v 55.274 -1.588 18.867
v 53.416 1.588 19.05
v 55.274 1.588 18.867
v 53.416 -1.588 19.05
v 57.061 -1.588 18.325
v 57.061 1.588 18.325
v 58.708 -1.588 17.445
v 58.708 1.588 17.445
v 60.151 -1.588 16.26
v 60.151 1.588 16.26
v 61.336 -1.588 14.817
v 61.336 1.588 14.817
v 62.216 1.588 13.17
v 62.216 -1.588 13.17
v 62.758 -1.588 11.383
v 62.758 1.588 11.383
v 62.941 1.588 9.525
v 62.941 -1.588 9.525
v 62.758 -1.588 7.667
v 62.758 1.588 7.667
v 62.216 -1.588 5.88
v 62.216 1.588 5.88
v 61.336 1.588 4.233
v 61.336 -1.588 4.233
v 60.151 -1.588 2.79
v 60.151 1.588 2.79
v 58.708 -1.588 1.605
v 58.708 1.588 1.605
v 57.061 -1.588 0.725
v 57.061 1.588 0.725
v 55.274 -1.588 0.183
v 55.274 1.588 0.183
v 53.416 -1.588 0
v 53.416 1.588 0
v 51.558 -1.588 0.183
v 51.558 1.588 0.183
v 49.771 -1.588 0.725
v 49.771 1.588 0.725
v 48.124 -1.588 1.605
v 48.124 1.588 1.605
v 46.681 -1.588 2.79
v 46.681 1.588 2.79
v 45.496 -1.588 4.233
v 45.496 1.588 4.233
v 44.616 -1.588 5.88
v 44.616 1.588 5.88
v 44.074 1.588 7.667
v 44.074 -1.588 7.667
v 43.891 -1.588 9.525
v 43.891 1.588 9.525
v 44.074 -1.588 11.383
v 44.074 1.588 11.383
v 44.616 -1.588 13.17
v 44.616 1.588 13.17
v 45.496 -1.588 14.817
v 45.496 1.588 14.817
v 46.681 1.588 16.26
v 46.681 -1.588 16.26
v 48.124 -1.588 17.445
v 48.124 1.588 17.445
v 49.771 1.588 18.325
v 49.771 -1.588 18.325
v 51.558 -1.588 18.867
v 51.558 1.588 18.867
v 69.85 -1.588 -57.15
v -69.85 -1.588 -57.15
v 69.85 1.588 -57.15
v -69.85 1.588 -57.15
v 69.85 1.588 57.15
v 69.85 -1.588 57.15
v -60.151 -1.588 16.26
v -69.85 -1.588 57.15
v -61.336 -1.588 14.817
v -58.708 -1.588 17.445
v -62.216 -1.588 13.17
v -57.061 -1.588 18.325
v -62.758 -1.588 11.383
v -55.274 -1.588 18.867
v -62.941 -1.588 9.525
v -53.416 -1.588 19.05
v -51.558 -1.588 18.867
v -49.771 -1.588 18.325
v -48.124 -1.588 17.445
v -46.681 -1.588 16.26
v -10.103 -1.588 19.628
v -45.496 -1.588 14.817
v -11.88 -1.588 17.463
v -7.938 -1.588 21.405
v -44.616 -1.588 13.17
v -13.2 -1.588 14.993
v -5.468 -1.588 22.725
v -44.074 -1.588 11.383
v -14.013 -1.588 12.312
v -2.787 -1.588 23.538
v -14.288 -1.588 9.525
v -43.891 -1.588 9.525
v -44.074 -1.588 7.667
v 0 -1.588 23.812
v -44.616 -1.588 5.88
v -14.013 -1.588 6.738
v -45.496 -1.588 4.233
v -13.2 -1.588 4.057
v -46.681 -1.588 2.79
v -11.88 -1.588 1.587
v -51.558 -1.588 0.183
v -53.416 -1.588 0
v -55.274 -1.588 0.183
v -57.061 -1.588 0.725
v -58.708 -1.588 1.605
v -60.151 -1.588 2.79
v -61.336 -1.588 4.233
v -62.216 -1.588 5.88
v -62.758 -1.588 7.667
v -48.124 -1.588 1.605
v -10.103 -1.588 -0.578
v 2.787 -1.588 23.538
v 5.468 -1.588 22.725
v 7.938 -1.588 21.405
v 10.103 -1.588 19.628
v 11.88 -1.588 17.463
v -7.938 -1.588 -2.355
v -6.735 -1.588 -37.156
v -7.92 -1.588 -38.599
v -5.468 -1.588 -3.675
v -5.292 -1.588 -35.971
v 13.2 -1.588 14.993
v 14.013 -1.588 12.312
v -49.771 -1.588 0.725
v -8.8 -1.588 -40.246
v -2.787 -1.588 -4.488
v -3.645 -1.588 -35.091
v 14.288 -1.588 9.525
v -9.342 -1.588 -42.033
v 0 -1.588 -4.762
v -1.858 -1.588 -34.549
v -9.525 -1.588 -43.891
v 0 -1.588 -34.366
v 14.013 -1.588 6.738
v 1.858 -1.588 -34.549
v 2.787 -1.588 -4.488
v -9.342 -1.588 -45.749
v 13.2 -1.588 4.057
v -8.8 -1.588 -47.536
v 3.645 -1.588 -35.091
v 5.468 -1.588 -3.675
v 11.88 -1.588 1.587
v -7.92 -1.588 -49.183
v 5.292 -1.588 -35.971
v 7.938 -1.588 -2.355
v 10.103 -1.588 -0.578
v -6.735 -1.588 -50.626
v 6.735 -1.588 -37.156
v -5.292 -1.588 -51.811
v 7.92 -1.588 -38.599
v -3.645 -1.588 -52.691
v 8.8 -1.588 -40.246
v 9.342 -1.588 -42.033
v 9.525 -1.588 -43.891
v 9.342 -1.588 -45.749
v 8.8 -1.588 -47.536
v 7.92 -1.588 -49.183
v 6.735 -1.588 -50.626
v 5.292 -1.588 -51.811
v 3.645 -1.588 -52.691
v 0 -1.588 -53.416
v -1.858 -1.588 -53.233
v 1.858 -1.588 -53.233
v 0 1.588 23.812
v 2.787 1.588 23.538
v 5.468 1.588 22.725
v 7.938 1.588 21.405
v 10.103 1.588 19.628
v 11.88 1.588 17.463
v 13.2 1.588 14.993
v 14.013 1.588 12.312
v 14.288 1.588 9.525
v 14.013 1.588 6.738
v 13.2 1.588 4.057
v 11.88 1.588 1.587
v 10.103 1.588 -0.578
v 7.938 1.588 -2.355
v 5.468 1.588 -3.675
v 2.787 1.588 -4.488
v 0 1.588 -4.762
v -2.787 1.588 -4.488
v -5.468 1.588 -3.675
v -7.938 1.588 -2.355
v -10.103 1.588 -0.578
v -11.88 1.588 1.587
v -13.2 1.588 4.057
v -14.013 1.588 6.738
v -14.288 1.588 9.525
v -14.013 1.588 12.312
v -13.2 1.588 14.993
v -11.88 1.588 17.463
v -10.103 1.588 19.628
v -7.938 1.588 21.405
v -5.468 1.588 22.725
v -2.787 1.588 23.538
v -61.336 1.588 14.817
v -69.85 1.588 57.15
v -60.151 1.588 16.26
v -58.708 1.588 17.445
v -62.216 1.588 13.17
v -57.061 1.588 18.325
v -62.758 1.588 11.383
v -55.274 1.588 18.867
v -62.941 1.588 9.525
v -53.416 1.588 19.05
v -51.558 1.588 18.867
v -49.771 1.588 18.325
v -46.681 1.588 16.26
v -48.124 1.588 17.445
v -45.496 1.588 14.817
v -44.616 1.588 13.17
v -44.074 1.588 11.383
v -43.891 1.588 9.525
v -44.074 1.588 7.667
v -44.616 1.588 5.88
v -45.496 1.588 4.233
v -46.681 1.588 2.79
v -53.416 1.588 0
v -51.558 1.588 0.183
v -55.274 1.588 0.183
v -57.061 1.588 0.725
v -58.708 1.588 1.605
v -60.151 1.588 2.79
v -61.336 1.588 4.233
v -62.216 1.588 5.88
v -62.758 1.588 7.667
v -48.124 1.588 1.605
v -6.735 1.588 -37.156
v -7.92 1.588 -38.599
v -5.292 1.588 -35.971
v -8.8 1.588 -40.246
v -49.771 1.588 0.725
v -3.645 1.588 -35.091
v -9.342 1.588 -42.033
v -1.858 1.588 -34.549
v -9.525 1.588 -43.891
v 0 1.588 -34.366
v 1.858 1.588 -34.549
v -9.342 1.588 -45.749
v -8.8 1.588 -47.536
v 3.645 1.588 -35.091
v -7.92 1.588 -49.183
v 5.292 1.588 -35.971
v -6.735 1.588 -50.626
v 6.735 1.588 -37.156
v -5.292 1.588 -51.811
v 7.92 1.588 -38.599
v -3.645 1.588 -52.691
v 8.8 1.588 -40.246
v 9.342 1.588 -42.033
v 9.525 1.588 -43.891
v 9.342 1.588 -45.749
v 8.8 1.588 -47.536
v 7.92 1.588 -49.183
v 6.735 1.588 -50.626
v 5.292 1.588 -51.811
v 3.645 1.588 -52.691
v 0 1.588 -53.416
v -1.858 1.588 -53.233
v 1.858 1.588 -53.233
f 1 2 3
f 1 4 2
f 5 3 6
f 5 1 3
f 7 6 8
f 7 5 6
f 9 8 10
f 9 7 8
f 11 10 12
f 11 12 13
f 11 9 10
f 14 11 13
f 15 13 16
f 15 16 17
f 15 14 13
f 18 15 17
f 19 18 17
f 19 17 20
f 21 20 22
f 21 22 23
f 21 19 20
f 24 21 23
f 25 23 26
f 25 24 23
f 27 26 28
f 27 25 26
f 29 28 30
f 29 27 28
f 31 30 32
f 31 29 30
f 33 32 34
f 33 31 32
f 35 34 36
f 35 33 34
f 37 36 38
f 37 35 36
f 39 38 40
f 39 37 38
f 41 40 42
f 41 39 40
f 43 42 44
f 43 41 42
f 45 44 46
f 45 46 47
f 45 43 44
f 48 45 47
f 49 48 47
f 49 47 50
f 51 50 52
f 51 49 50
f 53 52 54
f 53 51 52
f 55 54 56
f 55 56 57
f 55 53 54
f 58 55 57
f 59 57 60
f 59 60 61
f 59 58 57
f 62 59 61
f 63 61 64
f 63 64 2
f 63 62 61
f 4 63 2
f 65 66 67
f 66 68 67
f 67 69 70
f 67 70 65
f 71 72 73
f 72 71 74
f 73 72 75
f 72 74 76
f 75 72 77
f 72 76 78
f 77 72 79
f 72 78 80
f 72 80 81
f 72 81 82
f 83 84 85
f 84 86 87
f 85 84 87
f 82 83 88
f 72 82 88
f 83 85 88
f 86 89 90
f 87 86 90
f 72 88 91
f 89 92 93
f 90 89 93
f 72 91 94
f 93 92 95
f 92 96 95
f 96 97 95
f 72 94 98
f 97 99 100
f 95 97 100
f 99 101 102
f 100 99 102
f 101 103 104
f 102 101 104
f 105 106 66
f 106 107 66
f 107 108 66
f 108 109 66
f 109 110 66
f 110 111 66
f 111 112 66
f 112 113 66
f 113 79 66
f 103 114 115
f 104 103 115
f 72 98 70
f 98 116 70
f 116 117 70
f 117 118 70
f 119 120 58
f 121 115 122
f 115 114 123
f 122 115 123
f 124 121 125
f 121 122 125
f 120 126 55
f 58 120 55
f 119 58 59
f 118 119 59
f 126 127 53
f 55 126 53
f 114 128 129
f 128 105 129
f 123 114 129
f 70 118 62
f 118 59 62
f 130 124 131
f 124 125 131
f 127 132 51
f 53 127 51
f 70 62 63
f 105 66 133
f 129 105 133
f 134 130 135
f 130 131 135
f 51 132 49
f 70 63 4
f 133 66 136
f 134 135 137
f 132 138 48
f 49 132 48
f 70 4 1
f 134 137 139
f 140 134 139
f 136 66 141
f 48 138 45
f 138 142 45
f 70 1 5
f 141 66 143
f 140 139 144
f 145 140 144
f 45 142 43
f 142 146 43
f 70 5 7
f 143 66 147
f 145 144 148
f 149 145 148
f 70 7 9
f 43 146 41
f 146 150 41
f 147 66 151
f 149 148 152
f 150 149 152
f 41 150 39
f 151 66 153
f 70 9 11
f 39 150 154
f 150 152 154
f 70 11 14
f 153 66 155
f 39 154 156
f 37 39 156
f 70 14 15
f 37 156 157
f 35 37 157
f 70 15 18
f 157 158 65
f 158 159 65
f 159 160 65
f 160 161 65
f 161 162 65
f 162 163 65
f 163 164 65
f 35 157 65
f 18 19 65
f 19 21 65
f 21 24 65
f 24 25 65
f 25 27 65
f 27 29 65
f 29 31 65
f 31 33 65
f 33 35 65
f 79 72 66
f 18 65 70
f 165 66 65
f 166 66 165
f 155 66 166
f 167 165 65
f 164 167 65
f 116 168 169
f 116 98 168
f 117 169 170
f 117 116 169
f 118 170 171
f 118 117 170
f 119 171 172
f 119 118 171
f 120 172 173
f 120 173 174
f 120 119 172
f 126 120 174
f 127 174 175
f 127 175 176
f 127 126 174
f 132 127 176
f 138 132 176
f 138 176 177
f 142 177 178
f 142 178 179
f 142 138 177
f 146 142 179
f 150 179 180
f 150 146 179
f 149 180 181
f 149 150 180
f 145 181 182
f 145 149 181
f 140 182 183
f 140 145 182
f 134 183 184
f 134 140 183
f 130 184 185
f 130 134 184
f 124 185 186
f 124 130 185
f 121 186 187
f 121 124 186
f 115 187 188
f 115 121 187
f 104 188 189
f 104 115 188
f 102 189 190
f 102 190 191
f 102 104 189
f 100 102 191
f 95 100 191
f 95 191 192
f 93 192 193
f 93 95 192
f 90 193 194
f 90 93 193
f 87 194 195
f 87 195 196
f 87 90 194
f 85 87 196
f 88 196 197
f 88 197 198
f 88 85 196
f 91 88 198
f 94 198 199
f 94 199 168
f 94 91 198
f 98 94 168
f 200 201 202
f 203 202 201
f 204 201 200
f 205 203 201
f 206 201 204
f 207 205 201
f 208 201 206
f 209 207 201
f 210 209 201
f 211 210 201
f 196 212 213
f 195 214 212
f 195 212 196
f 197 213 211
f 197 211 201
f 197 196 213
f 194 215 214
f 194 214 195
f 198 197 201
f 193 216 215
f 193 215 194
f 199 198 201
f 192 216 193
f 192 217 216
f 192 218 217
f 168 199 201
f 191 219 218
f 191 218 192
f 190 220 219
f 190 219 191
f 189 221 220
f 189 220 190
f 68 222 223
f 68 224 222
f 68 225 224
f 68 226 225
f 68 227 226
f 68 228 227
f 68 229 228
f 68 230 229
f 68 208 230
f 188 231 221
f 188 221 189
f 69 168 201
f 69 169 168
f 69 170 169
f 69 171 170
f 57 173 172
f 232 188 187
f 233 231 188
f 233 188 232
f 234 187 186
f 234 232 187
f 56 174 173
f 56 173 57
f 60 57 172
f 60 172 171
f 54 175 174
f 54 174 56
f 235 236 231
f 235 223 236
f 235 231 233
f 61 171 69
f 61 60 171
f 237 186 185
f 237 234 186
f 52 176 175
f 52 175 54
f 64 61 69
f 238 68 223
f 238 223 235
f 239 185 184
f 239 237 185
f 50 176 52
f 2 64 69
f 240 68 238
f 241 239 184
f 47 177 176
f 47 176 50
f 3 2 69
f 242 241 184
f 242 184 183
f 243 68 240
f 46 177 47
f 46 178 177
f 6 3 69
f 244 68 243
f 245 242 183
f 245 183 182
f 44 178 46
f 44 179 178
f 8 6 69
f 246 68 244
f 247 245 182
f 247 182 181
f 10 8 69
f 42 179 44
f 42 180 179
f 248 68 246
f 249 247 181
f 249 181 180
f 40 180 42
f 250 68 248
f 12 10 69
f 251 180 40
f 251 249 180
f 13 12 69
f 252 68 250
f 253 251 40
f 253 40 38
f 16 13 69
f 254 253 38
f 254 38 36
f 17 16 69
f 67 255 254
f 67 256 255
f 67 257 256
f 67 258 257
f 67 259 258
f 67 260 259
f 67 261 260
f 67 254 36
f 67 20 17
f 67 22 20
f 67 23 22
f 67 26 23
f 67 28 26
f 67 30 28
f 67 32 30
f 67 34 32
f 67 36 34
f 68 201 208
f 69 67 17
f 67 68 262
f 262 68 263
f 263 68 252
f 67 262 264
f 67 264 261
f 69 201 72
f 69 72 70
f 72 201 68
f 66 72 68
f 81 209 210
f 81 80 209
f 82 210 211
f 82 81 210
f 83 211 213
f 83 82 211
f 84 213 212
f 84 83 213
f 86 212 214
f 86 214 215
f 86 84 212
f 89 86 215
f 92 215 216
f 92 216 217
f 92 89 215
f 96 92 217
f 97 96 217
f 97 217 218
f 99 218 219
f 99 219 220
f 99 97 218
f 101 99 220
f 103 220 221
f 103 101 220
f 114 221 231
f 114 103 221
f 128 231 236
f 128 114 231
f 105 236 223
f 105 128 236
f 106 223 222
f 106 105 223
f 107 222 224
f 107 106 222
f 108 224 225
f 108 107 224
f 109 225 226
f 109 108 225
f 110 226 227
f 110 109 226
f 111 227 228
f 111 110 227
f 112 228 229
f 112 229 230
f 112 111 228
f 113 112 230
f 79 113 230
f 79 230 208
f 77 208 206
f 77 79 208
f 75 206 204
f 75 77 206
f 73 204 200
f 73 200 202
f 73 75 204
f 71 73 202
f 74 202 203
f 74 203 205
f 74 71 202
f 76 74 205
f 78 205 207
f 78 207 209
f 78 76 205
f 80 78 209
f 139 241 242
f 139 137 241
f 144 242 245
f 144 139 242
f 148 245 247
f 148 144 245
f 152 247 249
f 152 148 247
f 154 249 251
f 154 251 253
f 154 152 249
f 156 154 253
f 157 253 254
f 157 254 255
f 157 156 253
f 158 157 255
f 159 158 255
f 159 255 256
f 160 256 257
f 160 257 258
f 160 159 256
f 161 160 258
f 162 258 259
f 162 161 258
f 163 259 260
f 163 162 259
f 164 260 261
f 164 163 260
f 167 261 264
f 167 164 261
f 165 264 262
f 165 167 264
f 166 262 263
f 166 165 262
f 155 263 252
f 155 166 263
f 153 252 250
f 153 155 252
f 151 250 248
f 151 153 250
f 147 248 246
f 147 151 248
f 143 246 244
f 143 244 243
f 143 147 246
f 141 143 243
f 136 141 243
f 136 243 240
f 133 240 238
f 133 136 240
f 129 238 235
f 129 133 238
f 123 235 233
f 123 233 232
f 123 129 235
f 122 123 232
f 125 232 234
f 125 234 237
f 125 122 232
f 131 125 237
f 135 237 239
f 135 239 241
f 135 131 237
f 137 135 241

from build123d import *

# Parameters (mm, degrees)
SKETCH1_W           = 139.7
SKETCH1_H           = 114.3
SKETCH1_R           = 9.525
SKETCH1_R_2         = 14.2875
BOSS_EXTRUDE1_DEPTH = 1.5875


with BuildPart() as part:
    # Sketch1 → Boss-Extrude1 (new, symmetric)
    with BuildSketch(Plane(origin=(0, 0, 0), x_dir=(1, 0, 0), z_dir=(0, 1, 0))):
        Rectangle(SKETCH1_W, SKETCH1_H)
        with Locations(Location((0, 43.8912, 0), (0, 0, 270))):
            Circle(SKETCH1_R, mode=Mode.SUBTRACT)
        with Locations(Location((-53.4162, -9.525, 0), (0, 0, 270))):
            Circle(SKETCH1_R, mode=Mode.SUBTRACT)
        with Locations(Location((53.4162, -9.525, 0), (0, 0, 270))):
            Circle(SKETCH1_R, mode=Mode.SUBTRACT)
        with Locations(Location((0, -9.525, 0), (0, 0, 270))):
            Circle(SKETCH1_R_2, mode=Mode.SUBTRACT)
    extrude(amount=BOSS_EXTRUDE1_DEPTH, both=True)


solid = part.part
